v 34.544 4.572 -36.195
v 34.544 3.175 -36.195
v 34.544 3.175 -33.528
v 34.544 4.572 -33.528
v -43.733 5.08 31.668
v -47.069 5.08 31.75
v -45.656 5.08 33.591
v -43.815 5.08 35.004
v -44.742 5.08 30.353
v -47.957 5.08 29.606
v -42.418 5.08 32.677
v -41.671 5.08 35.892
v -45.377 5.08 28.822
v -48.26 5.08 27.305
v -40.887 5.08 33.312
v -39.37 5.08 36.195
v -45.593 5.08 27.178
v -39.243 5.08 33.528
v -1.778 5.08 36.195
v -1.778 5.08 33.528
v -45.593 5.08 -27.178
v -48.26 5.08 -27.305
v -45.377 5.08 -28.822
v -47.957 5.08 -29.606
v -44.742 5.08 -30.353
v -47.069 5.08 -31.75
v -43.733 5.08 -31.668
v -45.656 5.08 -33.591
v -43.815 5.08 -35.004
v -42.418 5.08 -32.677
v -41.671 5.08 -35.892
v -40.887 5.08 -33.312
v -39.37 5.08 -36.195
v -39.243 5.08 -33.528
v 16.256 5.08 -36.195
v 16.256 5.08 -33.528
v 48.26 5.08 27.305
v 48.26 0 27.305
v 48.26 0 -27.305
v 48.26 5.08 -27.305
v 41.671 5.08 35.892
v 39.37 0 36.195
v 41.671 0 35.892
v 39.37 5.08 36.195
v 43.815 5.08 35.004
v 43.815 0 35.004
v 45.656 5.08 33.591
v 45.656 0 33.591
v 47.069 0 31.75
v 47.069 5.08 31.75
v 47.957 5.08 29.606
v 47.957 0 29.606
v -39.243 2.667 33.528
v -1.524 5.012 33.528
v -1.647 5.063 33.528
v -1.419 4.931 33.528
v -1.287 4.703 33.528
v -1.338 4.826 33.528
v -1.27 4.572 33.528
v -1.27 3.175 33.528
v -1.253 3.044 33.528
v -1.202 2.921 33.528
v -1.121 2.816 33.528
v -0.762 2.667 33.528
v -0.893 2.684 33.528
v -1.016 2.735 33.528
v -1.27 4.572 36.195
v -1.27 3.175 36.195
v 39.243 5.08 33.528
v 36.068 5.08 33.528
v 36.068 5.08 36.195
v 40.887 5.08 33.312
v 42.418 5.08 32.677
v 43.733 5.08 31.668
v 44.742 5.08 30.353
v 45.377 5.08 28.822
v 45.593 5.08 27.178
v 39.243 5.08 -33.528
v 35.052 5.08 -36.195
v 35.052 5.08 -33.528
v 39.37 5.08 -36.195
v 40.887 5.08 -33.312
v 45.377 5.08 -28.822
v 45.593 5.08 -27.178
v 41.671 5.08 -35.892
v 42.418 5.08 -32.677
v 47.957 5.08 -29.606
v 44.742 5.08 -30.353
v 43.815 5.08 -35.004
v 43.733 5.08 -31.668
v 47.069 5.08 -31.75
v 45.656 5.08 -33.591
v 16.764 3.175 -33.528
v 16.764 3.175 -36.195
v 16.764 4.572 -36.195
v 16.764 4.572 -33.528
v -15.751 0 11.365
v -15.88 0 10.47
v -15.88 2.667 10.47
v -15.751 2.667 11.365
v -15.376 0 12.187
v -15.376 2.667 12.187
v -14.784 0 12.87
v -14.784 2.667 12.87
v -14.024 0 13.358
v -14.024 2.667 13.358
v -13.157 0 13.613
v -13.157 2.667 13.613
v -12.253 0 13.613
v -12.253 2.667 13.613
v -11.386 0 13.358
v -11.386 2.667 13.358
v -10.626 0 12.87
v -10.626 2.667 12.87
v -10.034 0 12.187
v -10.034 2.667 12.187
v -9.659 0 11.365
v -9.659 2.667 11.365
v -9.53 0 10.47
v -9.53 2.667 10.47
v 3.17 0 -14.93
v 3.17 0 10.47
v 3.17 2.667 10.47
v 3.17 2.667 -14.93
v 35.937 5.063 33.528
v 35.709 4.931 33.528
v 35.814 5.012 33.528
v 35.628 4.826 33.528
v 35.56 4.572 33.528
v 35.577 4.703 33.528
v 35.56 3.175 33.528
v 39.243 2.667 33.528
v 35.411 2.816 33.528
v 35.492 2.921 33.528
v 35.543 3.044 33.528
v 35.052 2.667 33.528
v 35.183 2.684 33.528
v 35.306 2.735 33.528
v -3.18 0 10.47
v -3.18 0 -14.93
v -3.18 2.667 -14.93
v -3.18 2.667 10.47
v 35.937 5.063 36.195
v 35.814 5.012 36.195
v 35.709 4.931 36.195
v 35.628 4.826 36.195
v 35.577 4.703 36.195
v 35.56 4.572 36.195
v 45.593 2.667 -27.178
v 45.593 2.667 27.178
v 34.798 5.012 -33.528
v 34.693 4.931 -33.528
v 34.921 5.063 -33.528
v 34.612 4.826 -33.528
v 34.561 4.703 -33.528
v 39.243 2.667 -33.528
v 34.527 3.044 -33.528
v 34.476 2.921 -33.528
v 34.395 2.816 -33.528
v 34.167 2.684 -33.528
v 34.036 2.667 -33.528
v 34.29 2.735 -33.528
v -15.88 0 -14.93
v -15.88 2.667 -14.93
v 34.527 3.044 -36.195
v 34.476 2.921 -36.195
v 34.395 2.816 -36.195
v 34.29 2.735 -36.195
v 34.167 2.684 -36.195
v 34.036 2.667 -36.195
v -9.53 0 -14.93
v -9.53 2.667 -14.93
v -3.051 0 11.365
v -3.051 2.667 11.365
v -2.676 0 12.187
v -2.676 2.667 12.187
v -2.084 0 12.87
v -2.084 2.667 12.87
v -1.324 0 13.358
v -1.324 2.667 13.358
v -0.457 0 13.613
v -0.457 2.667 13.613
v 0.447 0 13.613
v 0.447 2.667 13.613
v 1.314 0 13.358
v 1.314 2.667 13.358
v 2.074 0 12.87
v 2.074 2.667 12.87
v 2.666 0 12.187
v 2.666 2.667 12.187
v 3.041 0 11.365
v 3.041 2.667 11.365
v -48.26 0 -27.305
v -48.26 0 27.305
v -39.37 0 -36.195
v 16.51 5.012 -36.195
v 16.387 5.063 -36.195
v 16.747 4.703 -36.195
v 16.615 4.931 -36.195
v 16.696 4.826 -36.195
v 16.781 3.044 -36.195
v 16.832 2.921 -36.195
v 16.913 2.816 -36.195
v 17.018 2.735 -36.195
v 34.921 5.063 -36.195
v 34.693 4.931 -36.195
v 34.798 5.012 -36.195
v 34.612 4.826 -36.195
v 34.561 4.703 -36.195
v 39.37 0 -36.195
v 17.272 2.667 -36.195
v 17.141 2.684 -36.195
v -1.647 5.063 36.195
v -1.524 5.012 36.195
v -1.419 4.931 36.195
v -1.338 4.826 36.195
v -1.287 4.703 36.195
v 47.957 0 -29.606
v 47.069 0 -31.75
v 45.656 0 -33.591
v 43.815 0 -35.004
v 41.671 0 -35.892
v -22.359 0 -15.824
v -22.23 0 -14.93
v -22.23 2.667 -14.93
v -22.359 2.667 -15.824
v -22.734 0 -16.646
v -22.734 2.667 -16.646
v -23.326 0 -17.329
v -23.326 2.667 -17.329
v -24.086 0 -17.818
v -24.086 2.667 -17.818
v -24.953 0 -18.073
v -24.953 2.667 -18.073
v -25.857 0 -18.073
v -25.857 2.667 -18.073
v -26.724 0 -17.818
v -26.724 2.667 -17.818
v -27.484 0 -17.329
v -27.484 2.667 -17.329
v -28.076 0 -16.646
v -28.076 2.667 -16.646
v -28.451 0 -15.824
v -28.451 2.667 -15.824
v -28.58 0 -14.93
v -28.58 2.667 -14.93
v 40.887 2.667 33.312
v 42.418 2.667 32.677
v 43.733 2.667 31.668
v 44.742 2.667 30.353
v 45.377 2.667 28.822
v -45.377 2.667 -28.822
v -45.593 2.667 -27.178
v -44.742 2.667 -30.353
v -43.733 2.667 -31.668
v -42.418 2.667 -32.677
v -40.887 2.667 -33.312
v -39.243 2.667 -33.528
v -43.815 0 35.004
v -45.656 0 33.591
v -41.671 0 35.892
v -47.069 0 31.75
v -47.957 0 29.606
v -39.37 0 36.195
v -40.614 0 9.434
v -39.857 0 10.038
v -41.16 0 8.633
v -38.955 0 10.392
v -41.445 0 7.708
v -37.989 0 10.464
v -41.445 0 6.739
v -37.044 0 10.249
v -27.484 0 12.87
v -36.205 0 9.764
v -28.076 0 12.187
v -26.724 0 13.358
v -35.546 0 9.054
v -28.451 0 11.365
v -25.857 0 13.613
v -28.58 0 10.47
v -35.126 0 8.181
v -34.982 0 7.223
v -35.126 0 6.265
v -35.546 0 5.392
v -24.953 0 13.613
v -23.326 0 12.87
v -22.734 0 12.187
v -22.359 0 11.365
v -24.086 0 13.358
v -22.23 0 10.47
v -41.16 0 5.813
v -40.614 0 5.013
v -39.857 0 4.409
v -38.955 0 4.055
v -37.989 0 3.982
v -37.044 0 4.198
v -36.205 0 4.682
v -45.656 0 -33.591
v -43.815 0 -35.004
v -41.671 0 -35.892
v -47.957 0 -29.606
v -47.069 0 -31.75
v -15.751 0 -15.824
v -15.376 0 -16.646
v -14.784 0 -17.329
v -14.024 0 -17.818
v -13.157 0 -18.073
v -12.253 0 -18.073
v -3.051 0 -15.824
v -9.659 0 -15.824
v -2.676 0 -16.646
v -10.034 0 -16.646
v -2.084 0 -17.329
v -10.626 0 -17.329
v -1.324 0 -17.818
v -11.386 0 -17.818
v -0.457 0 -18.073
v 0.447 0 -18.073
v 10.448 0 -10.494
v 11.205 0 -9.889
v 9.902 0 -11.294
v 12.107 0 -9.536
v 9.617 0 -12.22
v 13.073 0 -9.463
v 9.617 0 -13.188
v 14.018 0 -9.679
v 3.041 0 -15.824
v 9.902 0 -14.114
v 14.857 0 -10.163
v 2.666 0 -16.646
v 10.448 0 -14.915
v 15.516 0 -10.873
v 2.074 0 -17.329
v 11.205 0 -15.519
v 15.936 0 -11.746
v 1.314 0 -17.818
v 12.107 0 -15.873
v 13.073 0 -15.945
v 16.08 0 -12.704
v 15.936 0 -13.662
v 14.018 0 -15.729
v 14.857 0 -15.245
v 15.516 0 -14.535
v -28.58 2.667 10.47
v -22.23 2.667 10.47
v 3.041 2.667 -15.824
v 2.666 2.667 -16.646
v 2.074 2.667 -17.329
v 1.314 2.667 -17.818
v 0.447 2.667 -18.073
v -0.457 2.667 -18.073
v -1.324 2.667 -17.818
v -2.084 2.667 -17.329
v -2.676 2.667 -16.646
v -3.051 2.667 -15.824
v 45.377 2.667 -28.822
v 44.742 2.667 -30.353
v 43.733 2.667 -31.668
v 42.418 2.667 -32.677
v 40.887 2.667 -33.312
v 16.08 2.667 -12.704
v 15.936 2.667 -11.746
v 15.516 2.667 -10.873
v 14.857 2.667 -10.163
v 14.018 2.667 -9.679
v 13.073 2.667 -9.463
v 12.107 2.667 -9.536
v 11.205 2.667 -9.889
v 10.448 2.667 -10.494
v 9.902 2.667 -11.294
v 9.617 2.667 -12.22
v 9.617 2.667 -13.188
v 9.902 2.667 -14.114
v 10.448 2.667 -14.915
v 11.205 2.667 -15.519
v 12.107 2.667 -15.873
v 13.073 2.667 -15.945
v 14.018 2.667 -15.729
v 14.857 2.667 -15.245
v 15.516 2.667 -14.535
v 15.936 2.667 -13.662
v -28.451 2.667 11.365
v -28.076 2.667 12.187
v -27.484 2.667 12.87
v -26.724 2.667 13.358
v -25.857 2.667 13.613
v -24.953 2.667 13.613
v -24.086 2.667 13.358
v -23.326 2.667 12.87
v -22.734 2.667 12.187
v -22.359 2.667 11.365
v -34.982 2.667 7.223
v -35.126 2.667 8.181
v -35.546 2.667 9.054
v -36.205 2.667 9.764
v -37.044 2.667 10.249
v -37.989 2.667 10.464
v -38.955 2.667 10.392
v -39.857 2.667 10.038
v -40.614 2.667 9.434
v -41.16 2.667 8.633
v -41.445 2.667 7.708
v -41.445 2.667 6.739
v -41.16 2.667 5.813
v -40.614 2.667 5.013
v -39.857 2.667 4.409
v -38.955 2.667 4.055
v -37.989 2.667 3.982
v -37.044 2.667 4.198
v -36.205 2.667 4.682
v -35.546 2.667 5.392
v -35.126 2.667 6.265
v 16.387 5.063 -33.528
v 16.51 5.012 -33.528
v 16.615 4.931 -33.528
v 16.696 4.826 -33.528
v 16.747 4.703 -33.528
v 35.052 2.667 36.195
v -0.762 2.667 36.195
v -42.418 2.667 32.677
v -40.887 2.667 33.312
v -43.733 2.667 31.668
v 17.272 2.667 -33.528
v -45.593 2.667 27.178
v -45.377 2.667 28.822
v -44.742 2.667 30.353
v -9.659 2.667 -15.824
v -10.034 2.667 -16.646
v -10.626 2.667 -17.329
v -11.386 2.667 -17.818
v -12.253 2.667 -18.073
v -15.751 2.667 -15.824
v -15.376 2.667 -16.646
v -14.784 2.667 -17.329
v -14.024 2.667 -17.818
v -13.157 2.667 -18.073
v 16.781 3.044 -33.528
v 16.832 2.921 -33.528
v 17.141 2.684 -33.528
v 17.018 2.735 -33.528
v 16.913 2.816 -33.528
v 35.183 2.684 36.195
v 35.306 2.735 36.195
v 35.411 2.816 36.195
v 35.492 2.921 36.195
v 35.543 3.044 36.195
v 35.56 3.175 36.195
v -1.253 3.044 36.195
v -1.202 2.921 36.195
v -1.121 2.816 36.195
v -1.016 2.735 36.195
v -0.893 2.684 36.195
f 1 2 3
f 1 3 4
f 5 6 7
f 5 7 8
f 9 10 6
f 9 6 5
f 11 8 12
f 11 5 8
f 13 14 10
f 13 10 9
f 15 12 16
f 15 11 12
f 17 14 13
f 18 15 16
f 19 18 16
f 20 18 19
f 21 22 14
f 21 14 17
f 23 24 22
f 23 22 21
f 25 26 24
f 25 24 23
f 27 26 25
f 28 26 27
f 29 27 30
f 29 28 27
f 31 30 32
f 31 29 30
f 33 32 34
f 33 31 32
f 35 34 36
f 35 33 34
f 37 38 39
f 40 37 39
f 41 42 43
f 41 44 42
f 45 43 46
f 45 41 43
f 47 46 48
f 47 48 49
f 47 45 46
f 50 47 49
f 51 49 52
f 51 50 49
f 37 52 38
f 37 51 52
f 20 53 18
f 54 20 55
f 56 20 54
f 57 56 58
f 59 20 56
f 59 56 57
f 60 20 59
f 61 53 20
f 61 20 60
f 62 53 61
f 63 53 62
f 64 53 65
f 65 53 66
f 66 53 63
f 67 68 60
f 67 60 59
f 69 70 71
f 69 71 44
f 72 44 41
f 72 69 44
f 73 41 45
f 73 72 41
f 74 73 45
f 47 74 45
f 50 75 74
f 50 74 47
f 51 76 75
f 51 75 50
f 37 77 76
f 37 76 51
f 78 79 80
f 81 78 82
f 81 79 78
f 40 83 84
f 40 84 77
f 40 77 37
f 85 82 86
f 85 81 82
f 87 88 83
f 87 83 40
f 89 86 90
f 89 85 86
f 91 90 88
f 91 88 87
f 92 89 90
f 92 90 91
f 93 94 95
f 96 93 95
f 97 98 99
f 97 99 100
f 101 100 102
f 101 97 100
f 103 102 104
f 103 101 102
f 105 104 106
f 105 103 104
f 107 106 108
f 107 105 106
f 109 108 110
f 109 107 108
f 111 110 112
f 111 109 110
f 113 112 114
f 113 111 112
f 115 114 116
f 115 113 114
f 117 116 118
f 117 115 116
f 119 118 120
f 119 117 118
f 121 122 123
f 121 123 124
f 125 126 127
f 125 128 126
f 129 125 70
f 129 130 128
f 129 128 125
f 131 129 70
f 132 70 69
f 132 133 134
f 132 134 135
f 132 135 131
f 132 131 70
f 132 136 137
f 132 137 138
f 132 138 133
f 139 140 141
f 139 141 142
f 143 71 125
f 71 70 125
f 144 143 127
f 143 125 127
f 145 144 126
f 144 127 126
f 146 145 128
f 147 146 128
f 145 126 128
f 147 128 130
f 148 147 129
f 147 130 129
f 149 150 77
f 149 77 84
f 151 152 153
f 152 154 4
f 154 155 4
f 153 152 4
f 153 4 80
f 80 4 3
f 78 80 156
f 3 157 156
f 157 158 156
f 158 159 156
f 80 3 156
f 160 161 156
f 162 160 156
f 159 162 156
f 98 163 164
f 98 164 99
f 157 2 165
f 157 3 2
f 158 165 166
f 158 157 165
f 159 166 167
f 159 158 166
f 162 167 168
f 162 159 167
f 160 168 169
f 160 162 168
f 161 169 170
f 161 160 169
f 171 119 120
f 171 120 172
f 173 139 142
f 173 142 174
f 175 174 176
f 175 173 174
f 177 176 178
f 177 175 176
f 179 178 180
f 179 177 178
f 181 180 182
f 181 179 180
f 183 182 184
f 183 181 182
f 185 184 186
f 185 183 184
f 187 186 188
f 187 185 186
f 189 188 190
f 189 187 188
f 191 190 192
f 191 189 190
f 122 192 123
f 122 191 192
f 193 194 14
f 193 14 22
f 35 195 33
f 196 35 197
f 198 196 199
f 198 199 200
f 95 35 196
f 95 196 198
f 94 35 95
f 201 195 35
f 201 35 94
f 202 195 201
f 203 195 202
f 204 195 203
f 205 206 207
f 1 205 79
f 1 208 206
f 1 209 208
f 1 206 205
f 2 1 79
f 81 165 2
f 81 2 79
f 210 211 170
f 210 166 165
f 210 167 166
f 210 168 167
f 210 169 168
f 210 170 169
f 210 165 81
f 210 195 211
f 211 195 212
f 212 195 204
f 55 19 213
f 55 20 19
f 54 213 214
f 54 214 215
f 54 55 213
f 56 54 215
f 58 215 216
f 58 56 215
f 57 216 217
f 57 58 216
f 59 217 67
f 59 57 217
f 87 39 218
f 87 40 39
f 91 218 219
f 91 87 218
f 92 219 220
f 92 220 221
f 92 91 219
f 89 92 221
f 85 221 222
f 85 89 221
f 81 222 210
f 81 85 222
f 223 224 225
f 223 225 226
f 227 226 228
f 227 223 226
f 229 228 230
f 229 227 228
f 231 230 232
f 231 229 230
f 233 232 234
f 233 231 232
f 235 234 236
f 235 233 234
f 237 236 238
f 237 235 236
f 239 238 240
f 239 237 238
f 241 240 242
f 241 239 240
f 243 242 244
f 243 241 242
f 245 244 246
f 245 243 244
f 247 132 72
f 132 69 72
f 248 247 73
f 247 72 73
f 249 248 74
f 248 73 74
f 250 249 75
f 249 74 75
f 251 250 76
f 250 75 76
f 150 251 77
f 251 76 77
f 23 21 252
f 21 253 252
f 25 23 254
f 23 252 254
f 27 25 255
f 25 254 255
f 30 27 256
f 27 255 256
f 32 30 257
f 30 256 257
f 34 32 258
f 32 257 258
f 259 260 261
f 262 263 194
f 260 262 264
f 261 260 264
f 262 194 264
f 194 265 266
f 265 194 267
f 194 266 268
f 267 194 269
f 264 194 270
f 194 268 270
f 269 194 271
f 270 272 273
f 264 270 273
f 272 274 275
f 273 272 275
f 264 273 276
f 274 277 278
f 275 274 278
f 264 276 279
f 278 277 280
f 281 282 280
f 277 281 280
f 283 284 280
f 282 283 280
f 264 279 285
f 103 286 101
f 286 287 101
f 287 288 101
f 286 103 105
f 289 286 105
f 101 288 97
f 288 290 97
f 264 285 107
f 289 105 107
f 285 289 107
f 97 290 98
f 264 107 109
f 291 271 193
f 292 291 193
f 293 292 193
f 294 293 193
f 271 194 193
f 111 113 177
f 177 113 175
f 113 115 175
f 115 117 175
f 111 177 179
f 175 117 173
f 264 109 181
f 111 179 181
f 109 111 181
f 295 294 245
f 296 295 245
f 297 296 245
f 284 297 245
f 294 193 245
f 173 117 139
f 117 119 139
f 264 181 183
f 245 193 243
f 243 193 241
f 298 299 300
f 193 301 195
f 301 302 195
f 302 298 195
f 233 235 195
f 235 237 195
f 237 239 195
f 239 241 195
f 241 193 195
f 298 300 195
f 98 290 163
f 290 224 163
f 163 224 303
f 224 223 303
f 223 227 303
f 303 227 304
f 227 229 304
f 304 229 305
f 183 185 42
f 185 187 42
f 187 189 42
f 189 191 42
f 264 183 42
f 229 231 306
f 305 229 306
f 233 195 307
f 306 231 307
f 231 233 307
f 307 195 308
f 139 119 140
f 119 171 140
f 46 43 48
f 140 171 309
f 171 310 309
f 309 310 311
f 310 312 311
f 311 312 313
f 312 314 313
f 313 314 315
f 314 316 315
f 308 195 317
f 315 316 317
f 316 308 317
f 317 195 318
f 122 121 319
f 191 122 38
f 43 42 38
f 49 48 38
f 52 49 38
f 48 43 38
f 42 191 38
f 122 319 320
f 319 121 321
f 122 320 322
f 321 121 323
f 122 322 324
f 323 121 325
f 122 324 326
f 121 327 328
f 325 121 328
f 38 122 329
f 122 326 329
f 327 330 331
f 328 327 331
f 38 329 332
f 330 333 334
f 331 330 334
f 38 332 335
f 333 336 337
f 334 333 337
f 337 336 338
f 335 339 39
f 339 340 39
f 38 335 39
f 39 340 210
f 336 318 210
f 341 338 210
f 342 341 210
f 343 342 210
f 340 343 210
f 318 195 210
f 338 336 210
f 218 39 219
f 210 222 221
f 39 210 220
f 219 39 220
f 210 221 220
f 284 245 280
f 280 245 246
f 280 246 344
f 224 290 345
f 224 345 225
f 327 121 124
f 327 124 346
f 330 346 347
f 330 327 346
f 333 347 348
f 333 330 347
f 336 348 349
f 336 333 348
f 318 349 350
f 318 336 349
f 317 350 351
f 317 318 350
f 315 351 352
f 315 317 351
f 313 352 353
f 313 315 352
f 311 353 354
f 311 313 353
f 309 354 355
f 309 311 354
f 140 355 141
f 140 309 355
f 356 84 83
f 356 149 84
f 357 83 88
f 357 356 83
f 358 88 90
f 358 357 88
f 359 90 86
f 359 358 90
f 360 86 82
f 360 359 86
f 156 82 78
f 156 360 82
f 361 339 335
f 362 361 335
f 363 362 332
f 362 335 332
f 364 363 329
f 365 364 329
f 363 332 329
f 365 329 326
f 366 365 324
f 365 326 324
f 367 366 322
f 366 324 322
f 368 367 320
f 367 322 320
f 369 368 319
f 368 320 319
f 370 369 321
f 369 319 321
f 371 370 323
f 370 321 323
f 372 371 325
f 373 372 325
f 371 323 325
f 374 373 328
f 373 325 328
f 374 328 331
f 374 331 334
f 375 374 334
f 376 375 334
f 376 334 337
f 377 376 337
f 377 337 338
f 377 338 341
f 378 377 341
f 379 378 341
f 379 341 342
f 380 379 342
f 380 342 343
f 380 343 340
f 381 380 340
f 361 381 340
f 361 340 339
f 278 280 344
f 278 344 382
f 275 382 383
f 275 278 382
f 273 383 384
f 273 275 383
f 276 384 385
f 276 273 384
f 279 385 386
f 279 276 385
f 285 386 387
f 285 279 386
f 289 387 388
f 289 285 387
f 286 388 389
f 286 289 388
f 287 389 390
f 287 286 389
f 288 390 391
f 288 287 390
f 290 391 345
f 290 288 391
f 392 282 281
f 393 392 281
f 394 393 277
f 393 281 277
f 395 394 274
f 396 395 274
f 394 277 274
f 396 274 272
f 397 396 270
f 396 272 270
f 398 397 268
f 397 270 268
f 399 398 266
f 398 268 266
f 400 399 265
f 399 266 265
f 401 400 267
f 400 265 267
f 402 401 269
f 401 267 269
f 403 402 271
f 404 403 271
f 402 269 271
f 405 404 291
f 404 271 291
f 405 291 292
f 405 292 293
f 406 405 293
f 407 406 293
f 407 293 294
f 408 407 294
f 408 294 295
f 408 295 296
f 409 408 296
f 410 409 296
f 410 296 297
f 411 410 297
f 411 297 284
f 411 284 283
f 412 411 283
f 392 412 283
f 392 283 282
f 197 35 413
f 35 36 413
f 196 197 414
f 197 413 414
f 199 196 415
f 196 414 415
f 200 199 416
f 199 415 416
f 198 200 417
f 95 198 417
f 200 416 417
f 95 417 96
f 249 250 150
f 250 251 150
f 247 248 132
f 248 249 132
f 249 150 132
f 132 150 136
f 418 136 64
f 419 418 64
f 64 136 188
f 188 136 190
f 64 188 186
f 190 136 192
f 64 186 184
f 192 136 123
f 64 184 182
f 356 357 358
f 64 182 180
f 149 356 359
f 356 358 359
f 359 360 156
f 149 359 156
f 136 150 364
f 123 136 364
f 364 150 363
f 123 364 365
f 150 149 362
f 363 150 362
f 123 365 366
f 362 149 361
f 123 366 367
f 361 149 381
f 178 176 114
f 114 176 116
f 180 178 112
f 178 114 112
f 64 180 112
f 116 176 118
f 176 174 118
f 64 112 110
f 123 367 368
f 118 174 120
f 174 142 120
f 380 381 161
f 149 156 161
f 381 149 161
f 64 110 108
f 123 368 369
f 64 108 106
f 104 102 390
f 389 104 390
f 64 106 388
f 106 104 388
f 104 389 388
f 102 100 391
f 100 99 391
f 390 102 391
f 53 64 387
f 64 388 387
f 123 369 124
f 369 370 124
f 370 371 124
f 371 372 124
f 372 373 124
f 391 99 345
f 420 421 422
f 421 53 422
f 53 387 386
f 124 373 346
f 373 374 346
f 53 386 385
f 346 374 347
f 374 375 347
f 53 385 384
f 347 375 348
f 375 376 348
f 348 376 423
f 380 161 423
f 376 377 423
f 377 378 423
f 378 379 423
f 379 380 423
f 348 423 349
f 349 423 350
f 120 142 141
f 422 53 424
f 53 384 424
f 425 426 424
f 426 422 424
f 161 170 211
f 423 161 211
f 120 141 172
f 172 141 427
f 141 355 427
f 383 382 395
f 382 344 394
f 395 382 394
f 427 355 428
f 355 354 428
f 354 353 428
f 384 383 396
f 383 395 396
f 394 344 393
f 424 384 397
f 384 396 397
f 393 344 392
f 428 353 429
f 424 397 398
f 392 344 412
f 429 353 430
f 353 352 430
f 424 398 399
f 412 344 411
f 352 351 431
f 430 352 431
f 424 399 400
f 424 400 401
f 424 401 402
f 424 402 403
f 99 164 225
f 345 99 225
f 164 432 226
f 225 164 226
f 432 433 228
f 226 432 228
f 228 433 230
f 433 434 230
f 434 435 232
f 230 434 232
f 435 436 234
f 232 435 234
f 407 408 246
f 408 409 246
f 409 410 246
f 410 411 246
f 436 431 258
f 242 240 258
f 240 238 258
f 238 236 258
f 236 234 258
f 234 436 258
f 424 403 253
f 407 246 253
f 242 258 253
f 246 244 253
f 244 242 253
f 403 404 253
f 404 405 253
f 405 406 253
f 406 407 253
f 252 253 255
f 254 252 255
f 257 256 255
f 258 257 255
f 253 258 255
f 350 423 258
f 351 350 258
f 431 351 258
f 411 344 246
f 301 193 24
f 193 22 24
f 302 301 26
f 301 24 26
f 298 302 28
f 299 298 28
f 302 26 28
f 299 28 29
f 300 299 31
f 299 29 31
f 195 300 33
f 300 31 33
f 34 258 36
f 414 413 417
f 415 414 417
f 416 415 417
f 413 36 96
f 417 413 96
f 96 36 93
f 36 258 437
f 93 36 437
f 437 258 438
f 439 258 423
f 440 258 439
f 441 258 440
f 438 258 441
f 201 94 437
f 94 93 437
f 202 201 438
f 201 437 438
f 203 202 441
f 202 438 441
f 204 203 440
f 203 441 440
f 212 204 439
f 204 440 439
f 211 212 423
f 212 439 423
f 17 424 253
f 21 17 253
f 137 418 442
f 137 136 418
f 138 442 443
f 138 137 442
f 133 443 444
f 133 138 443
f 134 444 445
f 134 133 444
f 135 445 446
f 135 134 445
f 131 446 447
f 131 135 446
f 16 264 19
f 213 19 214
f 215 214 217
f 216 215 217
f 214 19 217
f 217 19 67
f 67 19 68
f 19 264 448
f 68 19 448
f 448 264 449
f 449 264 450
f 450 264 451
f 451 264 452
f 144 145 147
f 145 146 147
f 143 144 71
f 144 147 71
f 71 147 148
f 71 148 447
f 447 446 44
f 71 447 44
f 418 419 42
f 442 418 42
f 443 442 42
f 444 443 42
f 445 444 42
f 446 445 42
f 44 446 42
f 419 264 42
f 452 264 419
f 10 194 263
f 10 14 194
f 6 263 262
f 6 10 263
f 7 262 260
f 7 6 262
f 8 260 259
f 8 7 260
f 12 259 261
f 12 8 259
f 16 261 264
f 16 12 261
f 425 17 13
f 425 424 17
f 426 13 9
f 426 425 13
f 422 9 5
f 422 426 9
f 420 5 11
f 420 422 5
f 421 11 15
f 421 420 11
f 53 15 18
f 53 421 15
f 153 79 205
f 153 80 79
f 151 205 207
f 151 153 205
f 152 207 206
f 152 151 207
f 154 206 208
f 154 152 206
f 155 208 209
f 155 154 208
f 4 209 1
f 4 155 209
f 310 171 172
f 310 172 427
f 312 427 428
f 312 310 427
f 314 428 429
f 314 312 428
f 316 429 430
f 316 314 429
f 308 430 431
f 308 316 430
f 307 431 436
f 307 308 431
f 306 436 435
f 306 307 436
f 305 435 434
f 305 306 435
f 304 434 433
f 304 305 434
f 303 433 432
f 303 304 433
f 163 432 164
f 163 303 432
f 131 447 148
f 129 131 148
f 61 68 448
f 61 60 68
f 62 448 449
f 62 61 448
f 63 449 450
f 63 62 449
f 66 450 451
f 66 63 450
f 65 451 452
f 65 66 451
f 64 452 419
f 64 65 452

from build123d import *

# Parameters (mm, degrees)
SKETCH1_W           = 96.52
SKETCH1_H           = 72.39
BOSS_EXTRUDE1_DEPTH = 5.08
SHELL1_T            = -2.667
FILLET1_R           = 6.35
FILLET2_R           = 8.89
SKETCH2_W           = 36.83
SKETCH2_H           = 2.413
CUT_EXTRUDE1_DEPTH  = 5.08
SKETCH3_W           = 17.78
SKETCH3_H           = 2.413
CUT_EXTRUDE2_DEPTH  = 5.08
FILLET3_R           = 0.508
CUT_EXTRUDE3_REACH  = 7.08
SKETCH4_R           = 3.25
CUT_EXTRUDE4_DEPTH  = 6.08


with BuildPart() as part:
    # Sketch1 → Boss-Extrude1 (new body)
    with BuildSketch(Plane(origin=(0, 0, 0), x_dir=(1, 0, 0), z_dir=(0, 1, 0))):
        Rectangle(SKETCH1_W, SKETCH1_H)
    extrude(amount=BOSS_EXTRUDE1_DEPTH)

    # Shell1
    shell1_openings = [part.faces().sort_by_distance(p)[0] for p in [
        (0, 5.08, 0),
    ]]
    offset(amount=SHELL1_T, openings=shell1_openings, kind=Kind.INTERSECTION)

    # Fillet1
    fillet1_edges = [part.edges().sort_by_distance(p)[0] for p in [
        (45.593, 3.8735, 33.528),
        (45.593, 3.8735, -33.528),
        (-45.593, 3.8735, -33.528),
        (-45.593, 3.8735, 33.528),
    ]]
    fillet(fillet1_edges, radius=FILLET1_R)

    # Fillet2
    fillet2_edges = [part.edges().sort_by_distance(p)[0] for p in [
        (48.26, 2.54, 36.195),
        (-48.26, 2.54, 36.195),
        (-48.26, 2.54, -36.195),
        (48.26, 2.54, -36.195),
    ]]
    fillet(fillet2_edges, radius=FILLET2_R)

    # Sketch2 → Cut-Extrude1 (cut)
    with BuildSketch(Plane.XY.offset(36.195)):
        with Locations((17.145, 3.8735)):
            Rectangle(SKETCH2_W, SKETCH2_H)
    extrude(amount=-CUT_EXTRUDE1_DEPTH, mode=Mode.SUBTRACT)

    # Sketch3 → Cut-Extrude2 (cut)
    with BuildSketch(Plane(origin=(0, 0, -36.195), x_dir=(-1, 0, 0), z_dir=(0, 0, -1))):
        with Locations((-25.654, 3.8735)):
            Rectangle(SKETCH3_W, SKETCH3_H)
    extrude(amount=-CUT_EXTRUDE2_DEPTH, mode=Mode.SUBTRACT)

    # Fillet3
    fillet3_edges = [part.edges().sort_by_distance(p)[0] for p in [
        (34.544, 2.667, -34.8615),
        (34.544, 5.08, -34.8615),
        (16.764, 5.08, -34.8615),
        (16.764, 2.667, -34.8615),
        (35.56, 5.08, 34.8615),
        (35.56, 2.667, 34.8615),
        (-1.27, 2.667, 34.8615),
        (-1.27, 5.08, 34.8615),
    ]]
    fillet(fillet3_edges, radius=FILLET3_R)

    # Sketch4 → Cut-Extrude3 (cut, up to next)
    with BuildSketch(Plane.XZ, mode=Mode.PRIVATE) as cut_extrude3_sk1:
        with Locations((-38.231636466, 7.223235777)):
            Circle(SKETCH4_R)
    cut_extrude3_tool1 = extrude(cut_extrude3_sk1.sketch, amount=-CUT_EXTRUDE3_REACH, mode=Mode.PRIVATE) & part.part
    add(cut_extrude3_tool1.solids().sort_by_distance((-38.231636, 0, 7.223236))[0], mode=Mode.SUBTRACT)
    # Sketch4 → Cut-Extrude3 (cut, up to next)
    with BuildSketch(Plane.XZ, mode=Mode.PRIVATE) as cut_extrude3_sk2:
        with Locations((12.830494848, -12.70407972)):
            Circle(SKETCH4_R)
    cut_extrude3_tool2 = extrude(cut_extrude3_sk2.sketch, amount=-CUT_EXTRUDE3_REACH, mode=Mode.PRIVATE) & part.part
    add(cut_extrude3_tool2.solids().sort_by_distance((12.830495, 0, -12.70408))[0], mode=Mode.SUBTRACT)

    # Sketch5 → Cut-Extrude4 (cut, through all)
    with BuildSketch(Plane.XZ):
        with BuildLine():
            Line((-9.530108749, 10.470046155), (-9.530108749, -14.929953845))
            ThreePointArc((-9.530108749, -14.929953845), (-12.705108749, -18.104953845), (-15.880108749, -14.929953845))
            Line((-15.880108749, -14.929953845), (-15.880108749, 10.470046155))
            ThreePointArc((-15.880108749, 10.470046155), (-12.705108749, 13.645046155), (-9.530108749, 10.470046155))
        make_face()
        with BuildLine():
            Line((3.169891251, 10.470046155), (3.169891251, -14.929953845))
            ThreePointArc((3.169891251, -14.929953845), (-0.005108749, -18.104953845), (-3.180108749, -14.929953845))
            Line((-3.180108749, -14.929953845), (-3.180108749, 10.470046155))
            ThreePointArc((-3.180108749, 10.470046155), (-0.005108749, 13.645046155), (3.169891251, 10.470046155))
        make_face()
        with BuildLine():
            Line((-22.230108749, 10.470046155), (-22.230108749, -14.929953845))
            ThreePointArc((-22.230108749, -14.929953845), (-25.405108749, -18.104953845), (-28.580108749, -14.929953845))
            Line((-28.580108749, -14.929953845), (-28.580108749, 10.470046155))
            ThreePointArc((-28.580108749, 10.470046155), (-25.405108749, 13.645046155), (-22.230108749, 10.470046155))
        make_face()
    extrude(amount=-CUT_EXTRUDE4_DEPTH, mode=Mode.SUBTRACT)


solid = part.part
